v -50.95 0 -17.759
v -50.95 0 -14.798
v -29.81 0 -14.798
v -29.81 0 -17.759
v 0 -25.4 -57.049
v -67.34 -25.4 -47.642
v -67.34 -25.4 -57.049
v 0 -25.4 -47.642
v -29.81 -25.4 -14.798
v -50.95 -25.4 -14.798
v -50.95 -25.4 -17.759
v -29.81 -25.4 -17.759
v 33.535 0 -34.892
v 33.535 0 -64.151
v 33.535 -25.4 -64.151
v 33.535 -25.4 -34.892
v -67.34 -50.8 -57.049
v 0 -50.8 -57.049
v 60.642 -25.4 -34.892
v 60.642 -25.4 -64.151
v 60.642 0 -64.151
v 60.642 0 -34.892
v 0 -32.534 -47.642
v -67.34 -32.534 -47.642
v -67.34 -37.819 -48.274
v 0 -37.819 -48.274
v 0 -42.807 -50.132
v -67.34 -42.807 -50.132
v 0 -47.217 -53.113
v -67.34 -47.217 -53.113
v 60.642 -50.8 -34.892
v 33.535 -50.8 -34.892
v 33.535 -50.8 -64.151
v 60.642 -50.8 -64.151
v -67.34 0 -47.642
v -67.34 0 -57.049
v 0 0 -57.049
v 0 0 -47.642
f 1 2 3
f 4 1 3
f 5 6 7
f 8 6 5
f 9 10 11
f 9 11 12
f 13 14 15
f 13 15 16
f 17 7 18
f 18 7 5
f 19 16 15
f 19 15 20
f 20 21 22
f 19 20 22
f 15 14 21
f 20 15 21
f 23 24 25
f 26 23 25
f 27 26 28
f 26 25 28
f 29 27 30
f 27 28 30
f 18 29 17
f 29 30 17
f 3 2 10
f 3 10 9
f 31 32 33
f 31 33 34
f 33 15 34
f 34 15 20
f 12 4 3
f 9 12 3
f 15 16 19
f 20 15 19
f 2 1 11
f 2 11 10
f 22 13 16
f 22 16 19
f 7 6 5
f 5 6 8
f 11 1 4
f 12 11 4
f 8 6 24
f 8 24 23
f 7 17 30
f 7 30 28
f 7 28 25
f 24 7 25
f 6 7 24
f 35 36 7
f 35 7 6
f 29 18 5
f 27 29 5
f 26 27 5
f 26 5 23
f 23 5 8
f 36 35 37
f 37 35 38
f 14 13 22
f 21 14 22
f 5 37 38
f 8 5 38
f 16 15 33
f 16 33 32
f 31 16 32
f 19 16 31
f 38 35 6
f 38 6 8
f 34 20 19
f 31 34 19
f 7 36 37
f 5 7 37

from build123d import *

# Parameters (mm, degrees)
F0_W        = 67.3399567604
F0_H        = 9.4070211053
F1_DEPTH    = 25.4
F0_W_2      = 21.1403407156
F0_H_2      = 2.9615163803
F0_W_3      = 27.1071493626
F0_H_3      = 29.2595624924
F2_DEPTH    = 25.4
F3_T1_DEPTH = 158.6723585187


# Not quite as in the source:
# - a fillet or chamfer that OpenCascade refuses, or shapes differently, is made with other operations: its cross-section is extruded or revolved along the edge and cut away or added


with BuildPart() as f1:
    # F0 (on Front) → F1 (new body)
    with BuildSketch(Plane.XZ):
        with Locations((-33.6699783802, -52.3458756506)):
            Rectangle(F0_W, F0_H)
    extrude(amount=F1_DEPTH)


with BuildPart() as f1b:
    # F0 (on Front) → F1, piece 2 (new body)
    with BuildSketch(Plane.XZ):
        with Locations((-40.380159393, -16.2786431611)):
            Rectangle(F0_W_2, F0_H_2)
    extrude(amount=F1_DEPTH)


with BuildPart() as f1c:
    # F0 (on Front) → F1, piece 3 (new body)
    with BuildSketch(Plane.XZ):
        with Locations((47.0881126821, -49.5216473937)):
            Rectangle(F0_W_3, F0_H_3)
    extrude(amount=F1_DEPTH)


with BuildPart() as f2:
    # F2 (new): a face of the model
    f2_faces = [f1c.part.faces().sort_by_distance(p)[0] for p in [
        (47.0881126821, -25.4, -49.5216473937),
    ]]
    extrude(f2_faces, amount=F2_DEPTH)


with BuildPart() as f2b:
    # F2#2 (new): a face of the model
    f2_2_faces = [f1.part.faces().sort_by_distance(p)[0] for p in [
        (-33.6699783802, -25.4, -52.3458756506),
    ]]
    extrude(f2_2_faces, amount=F2_DEPTH)

    # F3: fillet of radius 22.4383652268 on 1 edges, made by hand

    # F3_s2 → F3_t1 (cut)
    with BuildSketch(Plane.YZ.offset(-113.0061576395)):
        with BuildLine():
            ThreePointArc((-32.5335196483, -47.642365098), (-42.8067415202, -50.1322680677), (-50.8, -57.0493862033))
            Line((-50.8, -57.0493862033), (-50.8, -47.642365098))
            Line((-50.8, -47.642365098), (-32.5335196483, -47.642365098))
        make_face()
    extrude(amount=F3_T1_DEPTH, mode=Mode.SUBTRACT)


solid = Compound([f1.part, f1b.part, f1c.part, f2.part, f2b.part])
